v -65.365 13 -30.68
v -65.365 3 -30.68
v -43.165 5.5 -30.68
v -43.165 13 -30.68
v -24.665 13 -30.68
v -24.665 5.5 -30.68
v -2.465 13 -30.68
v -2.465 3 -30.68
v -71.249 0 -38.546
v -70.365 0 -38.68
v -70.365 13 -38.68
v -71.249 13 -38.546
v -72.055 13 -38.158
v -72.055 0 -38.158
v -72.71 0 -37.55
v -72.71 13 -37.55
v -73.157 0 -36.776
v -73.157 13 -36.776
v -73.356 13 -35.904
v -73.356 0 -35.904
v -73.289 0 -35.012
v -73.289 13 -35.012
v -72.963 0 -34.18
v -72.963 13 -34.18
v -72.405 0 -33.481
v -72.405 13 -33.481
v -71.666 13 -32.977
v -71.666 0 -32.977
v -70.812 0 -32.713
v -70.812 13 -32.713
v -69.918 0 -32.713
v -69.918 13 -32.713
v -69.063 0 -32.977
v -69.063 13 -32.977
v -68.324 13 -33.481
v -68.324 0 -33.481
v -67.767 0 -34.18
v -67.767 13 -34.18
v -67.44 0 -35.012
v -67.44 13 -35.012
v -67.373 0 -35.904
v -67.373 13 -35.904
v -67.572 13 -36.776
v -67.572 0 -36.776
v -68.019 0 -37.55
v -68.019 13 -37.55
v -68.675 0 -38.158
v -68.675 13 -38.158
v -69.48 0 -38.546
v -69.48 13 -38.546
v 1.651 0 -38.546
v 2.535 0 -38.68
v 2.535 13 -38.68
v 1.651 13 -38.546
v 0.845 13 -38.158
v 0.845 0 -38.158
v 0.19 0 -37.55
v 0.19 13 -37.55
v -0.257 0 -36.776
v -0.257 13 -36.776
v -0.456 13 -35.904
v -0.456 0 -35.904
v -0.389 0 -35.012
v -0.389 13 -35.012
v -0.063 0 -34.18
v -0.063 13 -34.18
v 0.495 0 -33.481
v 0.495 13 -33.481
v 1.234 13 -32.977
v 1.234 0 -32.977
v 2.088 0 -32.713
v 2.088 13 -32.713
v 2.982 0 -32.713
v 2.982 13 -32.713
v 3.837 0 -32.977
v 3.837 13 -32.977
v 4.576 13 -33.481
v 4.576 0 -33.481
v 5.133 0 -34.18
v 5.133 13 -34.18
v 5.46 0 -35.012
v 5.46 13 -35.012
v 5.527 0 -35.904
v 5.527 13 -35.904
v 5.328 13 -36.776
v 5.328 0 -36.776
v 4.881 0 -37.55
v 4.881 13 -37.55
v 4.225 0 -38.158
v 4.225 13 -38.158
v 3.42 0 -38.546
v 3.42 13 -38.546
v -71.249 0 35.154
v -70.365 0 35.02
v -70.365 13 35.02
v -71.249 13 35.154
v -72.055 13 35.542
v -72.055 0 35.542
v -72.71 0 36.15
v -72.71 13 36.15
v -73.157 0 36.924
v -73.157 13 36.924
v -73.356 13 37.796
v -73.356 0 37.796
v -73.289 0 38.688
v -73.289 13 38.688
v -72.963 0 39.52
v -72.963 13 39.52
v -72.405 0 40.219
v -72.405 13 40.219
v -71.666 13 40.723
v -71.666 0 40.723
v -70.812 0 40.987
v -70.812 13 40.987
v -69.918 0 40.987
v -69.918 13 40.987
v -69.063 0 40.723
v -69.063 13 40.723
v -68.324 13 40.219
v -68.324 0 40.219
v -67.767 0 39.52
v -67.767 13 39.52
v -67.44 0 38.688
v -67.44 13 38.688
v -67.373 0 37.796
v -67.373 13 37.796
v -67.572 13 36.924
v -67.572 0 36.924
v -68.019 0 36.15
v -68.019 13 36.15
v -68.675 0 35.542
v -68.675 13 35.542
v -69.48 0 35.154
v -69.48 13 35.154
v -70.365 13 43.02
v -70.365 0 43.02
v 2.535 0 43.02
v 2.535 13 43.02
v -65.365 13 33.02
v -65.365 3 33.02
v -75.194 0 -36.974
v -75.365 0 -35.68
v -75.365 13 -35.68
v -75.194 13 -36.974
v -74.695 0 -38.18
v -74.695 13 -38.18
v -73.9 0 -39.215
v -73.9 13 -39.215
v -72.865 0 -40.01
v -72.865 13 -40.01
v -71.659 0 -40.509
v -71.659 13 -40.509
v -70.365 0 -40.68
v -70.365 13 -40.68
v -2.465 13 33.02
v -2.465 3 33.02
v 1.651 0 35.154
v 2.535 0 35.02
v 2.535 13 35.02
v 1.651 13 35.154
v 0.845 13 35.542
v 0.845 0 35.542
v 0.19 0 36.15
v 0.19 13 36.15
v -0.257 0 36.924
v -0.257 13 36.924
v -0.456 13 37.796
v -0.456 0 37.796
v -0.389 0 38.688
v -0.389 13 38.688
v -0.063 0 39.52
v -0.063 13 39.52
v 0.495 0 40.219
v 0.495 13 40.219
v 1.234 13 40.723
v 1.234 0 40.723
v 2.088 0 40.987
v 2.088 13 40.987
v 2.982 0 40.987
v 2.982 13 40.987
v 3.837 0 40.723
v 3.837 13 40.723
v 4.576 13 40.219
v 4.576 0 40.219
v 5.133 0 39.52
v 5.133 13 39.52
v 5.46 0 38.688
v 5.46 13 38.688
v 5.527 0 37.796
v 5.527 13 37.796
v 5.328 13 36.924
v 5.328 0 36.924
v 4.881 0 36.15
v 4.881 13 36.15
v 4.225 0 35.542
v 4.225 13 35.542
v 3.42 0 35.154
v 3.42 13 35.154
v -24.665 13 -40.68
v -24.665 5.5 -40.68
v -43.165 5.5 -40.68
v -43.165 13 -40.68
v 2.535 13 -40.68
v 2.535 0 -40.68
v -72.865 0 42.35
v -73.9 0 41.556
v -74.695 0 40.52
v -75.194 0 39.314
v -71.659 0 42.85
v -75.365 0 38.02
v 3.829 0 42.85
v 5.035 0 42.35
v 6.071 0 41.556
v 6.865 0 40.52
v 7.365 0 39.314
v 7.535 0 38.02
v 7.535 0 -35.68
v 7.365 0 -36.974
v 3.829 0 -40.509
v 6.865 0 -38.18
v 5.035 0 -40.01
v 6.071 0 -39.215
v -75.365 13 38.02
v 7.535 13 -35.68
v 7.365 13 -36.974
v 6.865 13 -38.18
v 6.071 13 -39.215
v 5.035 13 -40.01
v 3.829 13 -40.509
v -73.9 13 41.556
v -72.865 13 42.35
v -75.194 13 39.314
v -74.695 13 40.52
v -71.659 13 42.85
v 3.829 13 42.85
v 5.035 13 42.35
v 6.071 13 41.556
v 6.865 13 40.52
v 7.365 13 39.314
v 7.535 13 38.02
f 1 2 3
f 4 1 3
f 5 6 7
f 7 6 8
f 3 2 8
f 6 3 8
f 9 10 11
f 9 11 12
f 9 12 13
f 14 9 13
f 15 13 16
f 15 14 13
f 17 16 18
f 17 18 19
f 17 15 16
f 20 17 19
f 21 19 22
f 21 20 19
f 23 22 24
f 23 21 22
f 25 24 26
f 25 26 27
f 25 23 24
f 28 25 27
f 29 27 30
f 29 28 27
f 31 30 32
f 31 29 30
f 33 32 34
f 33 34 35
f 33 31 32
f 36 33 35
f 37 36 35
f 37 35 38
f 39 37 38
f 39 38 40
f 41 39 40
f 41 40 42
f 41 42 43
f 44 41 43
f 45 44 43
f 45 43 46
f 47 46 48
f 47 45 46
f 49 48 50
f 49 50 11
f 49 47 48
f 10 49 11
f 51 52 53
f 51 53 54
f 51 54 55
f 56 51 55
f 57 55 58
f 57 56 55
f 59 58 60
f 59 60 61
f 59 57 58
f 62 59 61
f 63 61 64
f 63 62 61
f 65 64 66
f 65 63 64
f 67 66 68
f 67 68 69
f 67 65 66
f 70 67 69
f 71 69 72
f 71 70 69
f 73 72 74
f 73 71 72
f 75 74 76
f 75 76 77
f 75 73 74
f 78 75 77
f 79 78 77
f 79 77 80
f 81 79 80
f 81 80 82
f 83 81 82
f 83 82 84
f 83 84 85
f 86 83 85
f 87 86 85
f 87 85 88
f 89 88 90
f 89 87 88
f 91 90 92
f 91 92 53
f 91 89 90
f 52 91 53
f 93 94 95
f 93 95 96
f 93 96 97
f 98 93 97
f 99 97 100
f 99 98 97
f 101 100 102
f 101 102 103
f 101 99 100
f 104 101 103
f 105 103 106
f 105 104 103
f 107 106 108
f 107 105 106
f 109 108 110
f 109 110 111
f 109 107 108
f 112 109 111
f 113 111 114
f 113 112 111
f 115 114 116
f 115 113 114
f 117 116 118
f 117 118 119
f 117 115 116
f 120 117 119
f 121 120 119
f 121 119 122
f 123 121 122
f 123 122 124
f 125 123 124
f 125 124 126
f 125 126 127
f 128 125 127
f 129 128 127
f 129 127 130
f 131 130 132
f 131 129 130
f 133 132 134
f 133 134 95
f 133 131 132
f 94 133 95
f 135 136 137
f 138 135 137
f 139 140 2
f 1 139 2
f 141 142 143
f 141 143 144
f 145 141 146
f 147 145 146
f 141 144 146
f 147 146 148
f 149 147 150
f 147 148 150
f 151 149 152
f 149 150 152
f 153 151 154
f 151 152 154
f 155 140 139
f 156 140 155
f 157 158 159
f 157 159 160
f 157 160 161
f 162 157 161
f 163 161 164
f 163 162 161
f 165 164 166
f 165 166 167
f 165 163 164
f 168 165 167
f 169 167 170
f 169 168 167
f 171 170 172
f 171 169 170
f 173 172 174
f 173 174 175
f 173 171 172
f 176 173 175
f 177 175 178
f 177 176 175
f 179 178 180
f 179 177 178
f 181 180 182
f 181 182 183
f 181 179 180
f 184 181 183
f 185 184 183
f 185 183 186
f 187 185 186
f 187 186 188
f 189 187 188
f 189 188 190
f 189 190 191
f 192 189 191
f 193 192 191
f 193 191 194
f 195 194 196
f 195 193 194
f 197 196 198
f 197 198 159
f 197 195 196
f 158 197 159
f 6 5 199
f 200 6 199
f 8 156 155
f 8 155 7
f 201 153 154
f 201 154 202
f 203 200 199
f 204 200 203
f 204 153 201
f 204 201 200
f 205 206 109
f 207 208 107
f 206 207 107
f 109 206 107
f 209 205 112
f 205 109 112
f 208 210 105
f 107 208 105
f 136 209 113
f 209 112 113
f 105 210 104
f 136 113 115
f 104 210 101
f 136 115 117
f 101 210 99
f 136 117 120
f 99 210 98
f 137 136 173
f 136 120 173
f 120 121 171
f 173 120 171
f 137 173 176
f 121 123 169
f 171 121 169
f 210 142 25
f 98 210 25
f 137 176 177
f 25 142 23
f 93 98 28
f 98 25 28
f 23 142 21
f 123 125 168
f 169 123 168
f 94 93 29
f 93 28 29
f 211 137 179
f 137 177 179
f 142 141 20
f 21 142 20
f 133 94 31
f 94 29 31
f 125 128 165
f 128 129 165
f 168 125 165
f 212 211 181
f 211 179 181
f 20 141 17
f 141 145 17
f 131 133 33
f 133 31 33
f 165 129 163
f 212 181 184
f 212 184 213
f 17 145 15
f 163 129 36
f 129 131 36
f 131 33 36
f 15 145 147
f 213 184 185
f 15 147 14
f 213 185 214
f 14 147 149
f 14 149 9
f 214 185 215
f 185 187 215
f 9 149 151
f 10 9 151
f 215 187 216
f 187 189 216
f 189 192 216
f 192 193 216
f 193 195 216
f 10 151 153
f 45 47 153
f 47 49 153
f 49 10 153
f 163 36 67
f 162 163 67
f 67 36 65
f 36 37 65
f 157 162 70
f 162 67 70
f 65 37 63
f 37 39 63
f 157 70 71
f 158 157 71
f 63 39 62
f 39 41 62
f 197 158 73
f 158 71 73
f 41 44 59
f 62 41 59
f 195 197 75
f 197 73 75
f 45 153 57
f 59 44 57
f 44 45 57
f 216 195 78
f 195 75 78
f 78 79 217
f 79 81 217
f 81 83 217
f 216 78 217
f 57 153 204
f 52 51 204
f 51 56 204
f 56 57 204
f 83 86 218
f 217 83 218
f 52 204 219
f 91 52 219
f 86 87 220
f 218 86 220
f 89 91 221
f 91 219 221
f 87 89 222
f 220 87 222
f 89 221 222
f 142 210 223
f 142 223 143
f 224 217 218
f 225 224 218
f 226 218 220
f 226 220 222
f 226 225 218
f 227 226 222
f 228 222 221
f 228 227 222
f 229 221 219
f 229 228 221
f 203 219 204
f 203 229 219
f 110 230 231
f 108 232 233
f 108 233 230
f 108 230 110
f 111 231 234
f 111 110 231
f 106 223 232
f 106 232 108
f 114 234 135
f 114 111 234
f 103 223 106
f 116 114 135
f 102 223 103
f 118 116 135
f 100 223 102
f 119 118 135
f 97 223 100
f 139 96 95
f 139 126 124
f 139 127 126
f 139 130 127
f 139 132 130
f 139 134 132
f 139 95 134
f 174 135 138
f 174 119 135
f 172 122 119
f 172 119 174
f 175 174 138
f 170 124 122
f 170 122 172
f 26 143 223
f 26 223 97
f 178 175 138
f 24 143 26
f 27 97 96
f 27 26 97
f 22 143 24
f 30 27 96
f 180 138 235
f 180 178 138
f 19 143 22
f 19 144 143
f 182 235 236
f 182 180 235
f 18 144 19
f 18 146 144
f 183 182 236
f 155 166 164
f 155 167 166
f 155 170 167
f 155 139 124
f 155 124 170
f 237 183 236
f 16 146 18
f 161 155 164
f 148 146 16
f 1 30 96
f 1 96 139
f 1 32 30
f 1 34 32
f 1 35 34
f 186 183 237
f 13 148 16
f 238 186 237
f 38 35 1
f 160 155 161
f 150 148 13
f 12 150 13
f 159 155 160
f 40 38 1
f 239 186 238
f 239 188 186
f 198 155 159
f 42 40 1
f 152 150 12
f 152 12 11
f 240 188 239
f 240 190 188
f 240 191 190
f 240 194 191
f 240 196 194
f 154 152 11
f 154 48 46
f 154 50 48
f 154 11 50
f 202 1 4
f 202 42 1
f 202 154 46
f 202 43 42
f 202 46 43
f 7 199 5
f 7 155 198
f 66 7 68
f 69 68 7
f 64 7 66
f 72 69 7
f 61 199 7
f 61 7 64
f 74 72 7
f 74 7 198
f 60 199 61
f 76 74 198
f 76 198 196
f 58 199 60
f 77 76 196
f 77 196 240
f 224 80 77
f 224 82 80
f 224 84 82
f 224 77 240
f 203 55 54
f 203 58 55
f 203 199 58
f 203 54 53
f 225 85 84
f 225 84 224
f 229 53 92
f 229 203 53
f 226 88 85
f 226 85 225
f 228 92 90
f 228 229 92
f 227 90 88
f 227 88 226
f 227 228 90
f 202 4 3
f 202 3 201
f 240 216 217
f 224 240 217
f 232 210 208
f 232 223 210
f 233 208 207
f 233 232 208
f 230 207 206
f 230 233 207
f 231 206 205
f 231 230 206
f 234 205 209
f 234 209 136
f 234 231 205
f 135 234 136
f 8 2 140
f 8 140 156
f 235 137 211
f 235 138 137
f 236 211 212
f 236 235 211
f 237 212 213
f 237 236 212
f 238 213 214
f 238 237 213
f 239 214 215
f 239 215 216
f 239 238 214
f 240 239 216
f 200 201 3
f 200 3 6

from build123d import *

# Parameters (mm, degrees)
SKETCH1_W           = 82.9
SKETCH1_H           = 83.7
SKETCH1_R           = 3
SKETCH1_W_2         = 62.9
SKETCH1_H_2         = 63.7
BOSS_EXTRUDE1_DEPTH = 13
SKETCH1_4_W         = 62.9
SKETCH1_4_H         = 63.7
BOSS_EXTRUDE2_DEPTH = 3
SKETCH2_W           = 18.5
SKETCH2_H           = 10
CUT_EXTRUDE1_DEPTH  = 7.5
FILLET1_R           = 5


with BuildPart() as part:
    # Sketch1 → Boss-Extrude1 (new body)
    with BuildSketch(Plane(origin=(0, 0, 0), x_dir=(1, 0, 0), z_dir=(0, 1, 0))):
        with Locations((-33.914696313, -1.170240017)):
            Rectangle(SKETCH1_W, SKETCH1_H)
        with Locations((-70.364696313, -38.020240017)):
            Circle(SKETCH1_R, mode=Mode.SUBTRACT)
        with Locations((2.535303687, -38.020240017)):
            Circle(SKETCH1_R, mode=Mode.SUBTRACT)
        with Locations((-70.364696313, 35.679759983)):
            Circle(SKETCH1_R, mode=Mode.SUBTRACT)
        with Locations((-33.914696313, -1.170240017)):
            Rectangle(SKETCH1_W_2, SKETCH1_H_2, mode=Mode.SUBTRACT)
        with Locations((2.535303687, 35.679759983)):
            Circle(SKETCH1_R, mode=Mode.SUBTRACT)
    extrude(amount=BOSS_EXTRUDE1_DEPTH)

    # Sketch1<4> → Boss-Extrude2 (add)
    with BuildSketch(Plane(origin=(0, 0, 0), x_dir=(1, 0, 0), z_dir=(0, 1, 0))):
        with Locations((-33.914696313, -1.170240017)):
            Rectangle(SKETCH1_4_W, SKETCH1_4_H)
    extrude(amount=BOSS_EXTRUDE2_DEPTH)

    # Sketch2 → Cut-Extrude1 (cut)
    with BuildSketch(Plane(origin=(0, 13, 0), x_dir=(1, 0, 0), z_dir=(0, 1, 0))):
        with Locations((-33.914696313, 35.679759983)):
            Rectangle(SKETCH2_W, SKETCH2_H)
    extrude(amount=-CUT_EXTRUDE1_DEPTH, mode=Mode.SUBTRACT)

    # Fillet1
    fillet1_edges = [part.edges().sort_by_distance(p)[0] for p in [
        (7.535303687, 6.5, 43.020240017),
        (-75.364696313, 6.5, 43.020240017),
        (7.535303687, 6.5, -40.679759983),
        (-75.364696313, 6.5, -40.679759983),
    ]]
    fillet(fillet1_edges, radius=FILLET1_R)


solid = part.part
